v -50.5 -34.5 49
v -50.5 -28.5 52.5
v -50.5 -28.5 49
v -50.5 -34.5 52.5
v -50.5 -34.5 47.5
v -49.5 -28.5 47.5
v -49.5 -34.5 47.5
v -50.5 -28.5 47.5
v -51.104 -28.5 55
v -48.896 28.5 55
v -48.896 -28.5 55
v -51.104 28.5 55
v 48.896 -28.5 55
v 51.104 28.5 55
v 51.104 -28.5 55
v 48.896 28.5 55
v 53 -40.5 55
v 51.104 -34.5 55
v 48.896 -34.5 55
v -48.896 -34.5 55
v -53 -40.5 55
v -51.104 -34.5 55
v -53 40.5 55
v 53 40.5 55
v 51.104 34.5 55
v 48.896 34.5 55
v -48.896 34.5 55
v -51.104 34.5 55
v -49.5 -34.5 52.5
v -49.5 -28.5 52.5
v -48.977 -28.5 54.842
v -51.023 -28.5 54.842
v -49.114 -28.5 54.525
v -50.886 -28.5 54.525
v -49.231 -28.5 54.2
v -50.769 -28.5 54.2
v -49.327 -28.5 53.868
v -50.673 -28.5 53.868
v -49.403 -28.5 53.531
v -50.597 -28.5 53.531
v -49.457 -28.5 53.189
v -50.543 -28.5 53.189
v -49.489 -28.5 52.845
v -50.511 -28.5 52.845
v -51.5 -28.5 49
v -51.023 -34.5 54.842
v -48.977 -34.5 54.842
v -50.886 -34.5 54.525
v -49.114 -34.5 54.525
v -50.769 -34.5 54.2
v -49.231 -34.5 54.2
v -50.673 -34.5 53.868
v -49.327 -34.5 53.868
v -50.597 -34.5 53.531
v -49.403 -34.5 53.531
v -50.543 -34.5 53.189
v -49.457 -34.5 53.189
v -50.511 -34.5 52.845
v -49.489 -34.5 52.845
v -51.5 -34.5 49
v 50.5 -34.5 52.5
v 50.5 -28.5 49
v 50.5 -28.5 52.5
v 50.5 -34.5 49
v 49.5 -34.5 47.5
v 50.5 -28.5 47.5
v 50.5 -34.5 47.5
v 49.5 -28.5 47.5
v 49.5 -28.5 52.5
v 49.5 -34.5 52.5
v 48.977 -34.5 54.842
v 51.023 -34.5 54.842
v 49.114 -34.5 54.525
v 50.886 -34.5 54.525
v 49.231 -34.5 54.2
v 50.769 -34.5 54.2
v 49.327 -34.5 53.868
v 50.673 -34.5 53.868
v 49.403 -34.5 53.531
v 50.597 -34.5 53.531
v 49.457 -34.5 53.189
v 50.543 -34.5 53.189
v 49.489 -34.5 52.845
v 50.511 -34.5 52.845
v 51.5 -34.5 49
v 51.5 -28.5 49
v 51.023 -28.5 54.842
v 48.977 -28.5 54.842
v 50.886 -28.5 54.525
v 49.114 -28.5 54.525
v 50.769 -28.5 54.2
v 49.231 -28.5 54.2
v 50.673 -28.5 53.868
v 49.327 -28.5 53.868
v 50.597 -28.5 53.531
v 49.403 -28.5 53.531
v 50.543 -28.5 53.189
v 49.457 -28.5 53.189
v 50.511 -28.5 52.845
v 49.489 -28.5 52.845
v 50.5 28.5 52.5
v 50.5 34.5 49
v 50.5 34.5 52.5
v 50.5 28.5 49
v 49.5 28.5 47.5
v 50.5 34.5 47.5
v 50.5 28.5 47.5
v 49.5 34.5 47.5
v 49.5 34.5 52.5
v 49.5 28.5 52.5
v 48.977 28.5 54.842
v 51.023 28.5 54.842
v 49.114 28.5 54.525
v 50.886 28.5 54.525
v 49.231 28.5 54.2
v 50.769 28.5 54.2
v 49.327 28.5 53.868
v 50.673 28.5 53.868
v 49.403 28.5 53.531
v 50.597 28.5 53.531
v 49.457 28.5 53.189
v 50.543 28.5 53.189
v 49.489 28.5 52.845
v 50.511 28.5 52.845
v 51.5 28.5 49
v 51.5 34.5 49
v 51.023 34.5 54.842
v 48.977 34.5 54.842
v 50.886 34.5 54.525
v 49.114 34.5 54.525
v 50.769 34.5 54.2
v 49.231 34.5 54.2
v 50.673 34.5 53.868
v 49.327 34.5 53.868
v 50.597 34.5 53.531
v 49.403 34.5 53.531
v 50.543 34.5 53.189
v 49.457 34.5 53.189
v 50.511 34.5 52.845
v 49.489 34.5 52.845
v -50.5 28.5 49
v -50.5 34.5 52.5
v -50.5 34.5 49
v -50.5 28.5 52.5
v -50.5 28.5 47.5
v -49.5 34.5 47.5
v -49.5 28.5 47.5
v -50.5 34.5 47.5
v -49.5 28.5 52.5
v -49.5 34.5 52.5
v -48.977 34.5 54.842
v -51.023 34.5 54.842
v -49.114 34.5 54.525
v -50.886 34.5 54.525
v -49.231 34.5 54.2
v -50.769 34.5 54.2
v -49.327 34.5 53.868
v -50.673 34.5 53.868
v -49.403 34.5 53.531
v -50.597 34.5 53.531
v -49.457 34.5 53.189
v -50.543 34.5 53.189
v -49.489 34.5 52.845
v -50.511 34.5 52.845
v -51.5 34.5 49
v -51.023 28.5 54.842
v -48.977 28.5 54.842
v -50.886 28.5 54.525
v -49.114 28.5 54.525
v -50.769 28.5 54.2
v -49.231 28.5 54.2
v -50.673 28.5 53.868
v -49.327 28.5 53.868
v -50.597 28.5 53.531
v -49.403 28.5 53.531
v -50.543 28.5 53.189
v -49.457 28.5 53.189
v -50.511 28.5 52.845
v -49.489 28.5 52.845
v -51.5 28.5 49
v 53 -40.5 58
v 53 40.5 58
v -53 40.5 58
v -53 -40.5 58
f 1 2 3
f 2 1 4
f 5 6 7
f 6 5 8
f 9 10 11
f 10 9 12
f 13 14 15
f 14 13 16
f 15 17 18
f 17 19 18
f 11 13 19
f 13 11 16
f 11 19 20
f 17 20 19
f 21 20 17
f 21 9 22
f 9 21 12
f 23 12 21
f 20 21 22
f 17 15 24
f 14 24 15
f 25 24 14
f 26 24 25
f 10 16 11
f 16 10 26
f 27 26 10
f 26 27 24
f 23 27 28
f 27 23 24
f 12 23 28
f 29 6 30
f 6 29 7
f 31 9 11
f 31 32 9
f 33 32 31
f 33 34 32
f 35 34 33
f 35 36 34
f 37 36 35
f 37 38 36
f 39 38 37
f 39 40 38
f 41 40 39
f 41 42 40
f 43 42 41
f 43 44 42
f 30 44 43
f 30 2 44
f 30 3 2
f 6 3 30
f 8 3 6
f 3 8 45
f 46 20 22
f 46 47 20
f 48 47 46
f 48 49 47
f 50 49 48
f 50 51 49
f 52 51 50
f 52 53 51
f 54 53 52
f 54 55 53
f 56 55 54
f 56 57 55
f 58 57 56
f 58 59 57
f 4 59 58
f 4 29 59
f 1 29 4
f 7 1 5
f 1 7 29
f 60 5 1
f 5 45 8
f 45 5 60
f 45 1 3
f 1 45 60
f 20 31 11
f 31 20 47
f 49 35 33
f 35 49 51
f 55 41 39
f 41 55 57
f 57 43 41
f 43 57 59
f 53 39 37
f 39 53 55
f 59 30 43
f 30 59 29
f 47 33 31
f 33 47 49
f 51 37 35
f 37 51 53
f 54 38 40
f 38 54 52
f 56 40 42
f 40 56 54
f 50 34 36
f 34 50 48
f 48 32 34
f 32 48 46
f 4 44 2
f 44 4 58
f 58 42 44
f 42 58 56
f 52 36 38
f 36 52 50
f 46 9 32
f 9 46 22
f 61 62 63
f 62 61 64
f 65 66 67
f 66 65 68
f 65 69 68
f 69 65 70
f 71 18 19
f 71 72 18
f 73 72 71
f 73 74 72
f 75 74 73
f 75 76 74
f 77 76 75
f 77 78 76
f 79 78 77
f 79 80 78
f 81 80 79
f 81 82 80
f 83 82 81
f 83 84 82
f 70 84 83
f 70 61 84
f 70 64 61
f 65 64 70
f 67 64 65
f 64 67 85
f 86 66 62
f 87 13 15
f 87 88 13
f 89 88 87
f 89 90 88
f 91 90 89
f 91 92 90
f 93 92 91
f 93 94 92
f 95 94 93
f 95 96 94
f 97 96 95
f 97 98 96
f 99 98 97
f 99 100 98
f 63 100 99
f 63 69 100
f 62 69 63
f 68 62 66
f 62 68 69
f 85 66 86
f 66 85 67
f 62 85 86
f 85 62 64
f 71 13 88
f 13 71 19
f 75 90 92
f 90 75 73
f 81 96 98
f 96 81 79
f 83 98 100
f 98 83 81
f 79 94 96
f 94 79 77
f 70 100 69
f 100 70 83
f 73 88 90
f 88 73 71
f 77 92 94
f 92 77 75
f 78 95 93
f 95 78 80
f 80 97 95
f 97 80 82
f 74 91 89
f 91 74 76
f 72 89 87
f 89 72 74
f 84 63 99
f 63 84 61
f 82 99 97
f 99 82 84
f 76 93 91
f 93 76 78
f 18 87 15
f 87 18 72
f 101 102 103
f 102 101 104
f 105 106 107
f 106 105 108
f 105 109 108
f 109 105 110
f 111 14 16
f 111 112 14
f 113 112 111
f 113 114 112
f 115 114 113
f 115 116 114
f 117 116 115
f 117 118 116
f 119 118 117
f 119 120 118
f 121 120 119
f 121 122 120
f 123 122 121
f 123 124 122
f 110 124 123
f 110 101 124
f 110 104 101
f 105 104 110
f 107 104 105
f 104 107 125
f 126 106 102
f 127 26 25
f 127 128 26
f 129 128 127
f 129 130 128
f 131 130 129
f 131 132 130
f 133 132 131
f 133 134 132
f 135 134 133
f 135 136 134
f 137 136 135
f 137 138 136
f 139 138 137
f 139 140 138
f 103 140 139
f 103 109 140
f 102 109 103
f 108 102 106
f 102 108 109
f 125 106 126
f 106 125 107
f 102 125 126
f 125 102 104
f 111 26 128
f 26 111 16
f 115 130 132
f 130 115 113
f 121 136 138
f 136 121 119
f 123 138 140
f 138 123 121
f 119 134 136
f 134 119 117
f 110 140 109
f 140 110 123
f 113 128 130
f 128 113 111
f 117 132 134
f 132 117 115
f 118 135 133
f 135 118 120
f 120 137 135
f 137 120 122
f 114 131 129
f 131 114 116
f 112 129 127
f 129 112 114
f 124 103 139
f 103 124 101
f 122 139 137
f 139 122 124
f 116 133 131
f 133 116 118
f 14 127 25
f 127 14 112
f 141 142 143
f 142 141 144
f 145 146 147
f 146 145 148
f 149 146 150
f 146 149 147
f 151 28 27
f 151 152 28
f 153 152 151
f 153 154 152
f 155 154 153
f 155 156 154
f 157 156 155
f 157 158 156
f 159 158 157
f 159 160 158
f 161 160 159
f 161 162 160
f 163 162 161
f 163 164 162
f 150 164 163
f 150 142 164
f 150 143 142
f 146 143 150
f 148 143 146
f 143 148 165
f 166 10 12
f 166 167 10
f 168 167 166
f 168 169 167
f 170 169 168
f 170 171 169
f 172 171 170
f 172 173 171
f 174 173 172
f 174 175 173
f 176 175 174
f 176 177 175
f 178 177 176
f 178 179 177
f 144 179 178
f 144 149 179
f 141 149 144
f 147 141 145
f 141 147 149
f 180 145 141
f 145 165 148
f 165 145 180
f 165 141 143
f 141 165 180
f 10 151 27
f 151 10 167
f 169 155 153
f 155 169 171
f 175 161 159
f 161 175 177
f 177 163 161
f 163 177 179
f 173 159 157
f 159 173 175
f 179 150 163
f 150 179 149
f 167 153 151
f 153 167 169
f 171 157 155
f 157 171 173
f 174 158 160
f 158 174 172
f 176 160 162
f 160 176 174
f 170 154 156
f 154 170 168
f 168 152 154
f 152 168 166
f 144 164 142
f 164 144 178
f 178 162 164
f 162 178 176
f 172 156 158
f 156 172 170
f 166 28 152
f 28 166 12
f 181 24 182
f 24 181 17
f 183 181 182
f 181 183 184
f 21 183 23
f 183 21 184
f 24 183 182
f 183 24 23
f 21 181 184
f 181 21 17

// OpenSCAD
BOX_OUTER_WIDTH = 106;
BOX_OUTER_LENGTH = 81;
BOX_OUTER_HEIGHT = 55;
THICKNESS = 3;
BUTTON_HOLE_D = 18;
SWITCH_WIDTH = 14.3;
SWITCH_LENGTH = 24.3;
SWITCH_SCREW_INSET = 2;
SWITCH_SCREW_OFFSET = SWITCH_WIDTH/2;
SWITCH_HOLE_D = 4;
TOGGLE_HOLE_D = 13.3;
POT_HOLE_D = 7.3;
POT_KNOB_D = 24;

LCD_DISPLAY_WIDTH = 71.5;
LCD_DISPLAY_HEIGHT = 26.5;
LCD_ANCHOR_WIDTH = 80;
LCD_ANCHOR_HEIGHT = 36.3;
LCD_HOLE_INSET = 1.5;
LCD_HOLE_D = 3;

$fn = 100;

 module prism(l, w, h){
   polyhedron(
       points=[[0,0,0], [l,0,0], [l,w,0], [0,w,0], [0,w,h], [l,w,h]],
       faces=[[0,1,2,3],[5,4,3,2],[0,4,5,1],[0,3,4],[5,2,1]]
   );
};
       
module cantilever(s,r) {
    CANTILEVER_LENGTH=10*s;
    CANTILEVER_HEIGHT=12*s;
    CANTILEVER_WIDTH=2*s;
    CANTILEVER_DEPTH=3*s;
    CANTILEVER_TAB=2*s;
    CANTILEVER_BASE_HEIGHT=5*s;
    CANTILEVER_BASE_FACTOR=2;
    cantilever_base = CANTILEVER_BASE_FACTOR * CANTILEVER_HEIGHT;
    rotate(r) {
      translate([-(CANTILEVER_WIDTH/2),-(CANTILEVER_HEIGHT/2), 0]){
          cube([CANTILEVER_WIDTH,CANTILEVER_HEIGHT,CANTILEVER_LENGTH + CANTILEVER_BASE_HEIGHT]);
          translate([CANTILEVER_WIDTH,CANTILEVER_HEIGHT,CANTILEVER_LENGTH+CANTILEVER_BASE_HEIGHT]){
              rotate([90,180,90]) {
                prism(CANTILEVER_HEIGHT, CANTILEVER_DEPTH, CANTILEVER_TAB);
              };
          };
      };
      FLARE_DIAMETER=cantilever_base - CANTILEVER_WIDTH;
      translate([-(cantilever_base/2), -(CANTILEVER_HEIGHT/2), 0]) {
          difference() {
              cube([cantilever_base, CANTILEVER_HEIGHT, CANTILEVER_BASE_HEIGHT]);
              union() {
                  translate([0,CANTILEVER_HEIGHT+1,CANTILEVER_BASE_HEIGHT]){
                      rotate([90,0,0]){
                          cylinder(h=CANTILEVER_HEIGHT+2, d=FLARE_DIAMETER, center=false);
                      };
                  };
                  translate([cantilever_base,CANTILEVER_HEIGHT+1,CANTILEVER_BASE_HEIGHT]){
                      rotate([90,0,0]){
                          cylinder(h=CANTILEVER_HEIGHT+2, d=FLARE_DIAMETER, center=false);
                      };
                  };
              };
          };
     };
  };
};

module cantilever_tab(s,r){
    CANTILEVER_LENGTH=10*s;
    CANTILEVER_HEIGHT=12*s;
    CANTILEVER_WIDTH=2*s;
    CANTILEVER_DEPTH=3*s;
    CANTILEVER_TAB=2*s;
    CANTILEVER_BASE_HEIGHT=5*s;
    CANTILEVER_BASE_FACTOR=2;
    cantilever_base = CANTILEVER_BASE_FACTOR * CANTILEVER_HEIGHT;
    rotate(r) {
      translate([-(CANTILEVER_WIDTH/2), -(CANTILEVER_HEIGHT/2)-0.05, -0.1]) {
          difference() {
            cube([2*CANTILEVER_WIDTH,CANTILEVER_HEIGHT+0.1,CANTILEVER_LENGTH + CANTILEVER_BASE_HEIGHT]);
            translate([(2*CANTILEVER_WIDTH)-(CANTILEVER_WIDTH*0.69),-0.1,CANTILEVER_HEIGHT-CANTILEVER_DEPTH+0.1]) {
              cube([CANTILEVER_WIDTH*0.7, CANTILEVER_HEIGHT+0.21, CANTILEVER_DEPTH]);
          };
        };
      };
    };
};

module Box(thickness){
  translate([-BOX_OUTER_WIDTH/2, -BOX_OUTER_LENGTH/2, 0]) {
    difference() {
      cube([
        BOX_OUTER_WIDTH,
        BOX_OUTER_LENGTH,
        BOX_OUTER_HEIGHT]);
      translate([thickness,thickness,thickness])
        cube([
          BOX_OUTER_WIDTH-(thickness*2),
          BOX_OUTER_LENGTH-(thickness*2),
          BOX_OUTER_HEIGHT-(thickness)+1]);
    }
  }
};

module Lid(thickness){
  translate([-BOX_OUTER_WIDTH/2, - BOX_OUTER_LENGTH/2, BOX_OUTER_HEIGHT]) {
      cube([
        BOX_OUTER_WIDTH,
        BOX_OUTER_LENGTH,
        thickness]);
  }
};

CANTILEVER_S = 0.5;
translate([0,0,BOX_OUTER_HEIGHT]) {
  translate([-BOX_OUTER_WIDTH/2+THICKNESS,-BOX_OUTER_LENGTH/2+(3*THICKNESS)]) {
    cantilever(0.5,[180,0,180]);
  }
  translate([BOX_OUTER_WIDTH/2-THICKNESS,-BOX_OUTER_LENGTH/2+(3*THICKNESS)]) {
    cantilever(0.5,[180,0,0]);
  }
  translate([BOX_OUTER_WIDTH/2-THICKNESS,BOX_OUTER_LENGTH/2-(3*THICKNESS)]) {
    cantilever(0.5,[180,0,0]);
  }
  translate([-BOX_OUTER_WIDTH/2+THICKNESS,BOX_OUTER_LENGTH/2-(3*THICKNESS)]) {
    cantilever(0.5,[180,0,180]);
  }
}
Lid(THICKNESS);

/*difference() {
  Box(THICKNESS);
  union() {
    translate([0,0,BOX_OUTER_HEIGHT]) {
      translate([-(BOX_OUTER_WIDTH/2)+THICKNESS,-(BOX_OUTER_LENGTH/2)+(3*THICKNESS),0]) {
        cantilever_tab(0.5,[180,0,180]);
      }
      translate([BOX_OUTER_WIDTH/2-THICKNESS,-BOX_OUTER_LENGTH/2+(3*THICKNESS)]) {
        cantilever_tab(0.5,[180,0,0]);
      }
      translate([BOX_OUTER_WIDTH/2-THICKNESS,BOX_OUTER_LENGTH/2-(3*THICKNESS)]) {
        cantilever_tab(0.5,[180,0,0]);
      }
      translate([-BOX_OUTER_WIDTH/2+THICKNESS,BOX_OUTER_LENGTH/2-(3*THICKNESS)]) {
        cantilever_tab(0.5,[180,0,180]);
      }
      translate([-BOX_OUTER_WIDTH/4-5,-BOX_OUTER_LENGTH/2-2,-9.9
      ]) {
        cube([10,10,10]);
      }
    }
    // Front panel
    translate([-34,-24,-0.1]) {
      cylinder(h=THICKNESS+0.2, d=BUTTON_HOLE_D,center=false);
      translate([22,0,0]) {
        cylinder(h=THICKNESS+0.2, d=BUTTON_HOLE_D,center=false);
        translate([22,0,0]) {
          cylinder(h=THICKNESS+0.2, d=BUTTON_HOLE_D, center=false);
        }
      }
      translate([0,22,0]){
        cylinder(h=THICKNESS+0.2, d=BUTTON_HOLE_D,center=false);
        translate([22,0,0]) {
          cylinder(h=THICKNESS+0.2, d=BUTTON_HOLE_D,center=false);
          translate([22,0,0]) {
            cylinder(h=THICKNESS+0.2, d=BUTTON_HOLE_D, center=false);
          }
        }
      }
    }
    translate([35, -19, -0.1]) {
      cylinder(h=THICKNESS+0.2, d=POT_HOLE_D, center=false);
    }
    translate([-34, 16, -0.1]) {
      cube([SWITCH_LENGTH, SWITCH_WIDTH, THICKNESS+0.2]);
      translate([-SWITCH_SCREW_OFFSET/2, SWITCH_SCREW_OFFSET, 0]) {
        cylinder(h=THICKNESS+0.2, d=SWITCH_HOLE_D, center=false);
      
        translate([SWITCH_LENGTH+SWITCH_SCREW_OFFSET, 0, 0]) {
          cylinder(h=THICKNESS+0.2, d=SWITCH_HOLE_D, center=false);
        }
      }
    }
    translate([36, 20, -0.1]) {
      cylinder(h=THICKNESS+0.2, d=TOGGLE_HOLE_D, center=false);
    }
  }
}*/
